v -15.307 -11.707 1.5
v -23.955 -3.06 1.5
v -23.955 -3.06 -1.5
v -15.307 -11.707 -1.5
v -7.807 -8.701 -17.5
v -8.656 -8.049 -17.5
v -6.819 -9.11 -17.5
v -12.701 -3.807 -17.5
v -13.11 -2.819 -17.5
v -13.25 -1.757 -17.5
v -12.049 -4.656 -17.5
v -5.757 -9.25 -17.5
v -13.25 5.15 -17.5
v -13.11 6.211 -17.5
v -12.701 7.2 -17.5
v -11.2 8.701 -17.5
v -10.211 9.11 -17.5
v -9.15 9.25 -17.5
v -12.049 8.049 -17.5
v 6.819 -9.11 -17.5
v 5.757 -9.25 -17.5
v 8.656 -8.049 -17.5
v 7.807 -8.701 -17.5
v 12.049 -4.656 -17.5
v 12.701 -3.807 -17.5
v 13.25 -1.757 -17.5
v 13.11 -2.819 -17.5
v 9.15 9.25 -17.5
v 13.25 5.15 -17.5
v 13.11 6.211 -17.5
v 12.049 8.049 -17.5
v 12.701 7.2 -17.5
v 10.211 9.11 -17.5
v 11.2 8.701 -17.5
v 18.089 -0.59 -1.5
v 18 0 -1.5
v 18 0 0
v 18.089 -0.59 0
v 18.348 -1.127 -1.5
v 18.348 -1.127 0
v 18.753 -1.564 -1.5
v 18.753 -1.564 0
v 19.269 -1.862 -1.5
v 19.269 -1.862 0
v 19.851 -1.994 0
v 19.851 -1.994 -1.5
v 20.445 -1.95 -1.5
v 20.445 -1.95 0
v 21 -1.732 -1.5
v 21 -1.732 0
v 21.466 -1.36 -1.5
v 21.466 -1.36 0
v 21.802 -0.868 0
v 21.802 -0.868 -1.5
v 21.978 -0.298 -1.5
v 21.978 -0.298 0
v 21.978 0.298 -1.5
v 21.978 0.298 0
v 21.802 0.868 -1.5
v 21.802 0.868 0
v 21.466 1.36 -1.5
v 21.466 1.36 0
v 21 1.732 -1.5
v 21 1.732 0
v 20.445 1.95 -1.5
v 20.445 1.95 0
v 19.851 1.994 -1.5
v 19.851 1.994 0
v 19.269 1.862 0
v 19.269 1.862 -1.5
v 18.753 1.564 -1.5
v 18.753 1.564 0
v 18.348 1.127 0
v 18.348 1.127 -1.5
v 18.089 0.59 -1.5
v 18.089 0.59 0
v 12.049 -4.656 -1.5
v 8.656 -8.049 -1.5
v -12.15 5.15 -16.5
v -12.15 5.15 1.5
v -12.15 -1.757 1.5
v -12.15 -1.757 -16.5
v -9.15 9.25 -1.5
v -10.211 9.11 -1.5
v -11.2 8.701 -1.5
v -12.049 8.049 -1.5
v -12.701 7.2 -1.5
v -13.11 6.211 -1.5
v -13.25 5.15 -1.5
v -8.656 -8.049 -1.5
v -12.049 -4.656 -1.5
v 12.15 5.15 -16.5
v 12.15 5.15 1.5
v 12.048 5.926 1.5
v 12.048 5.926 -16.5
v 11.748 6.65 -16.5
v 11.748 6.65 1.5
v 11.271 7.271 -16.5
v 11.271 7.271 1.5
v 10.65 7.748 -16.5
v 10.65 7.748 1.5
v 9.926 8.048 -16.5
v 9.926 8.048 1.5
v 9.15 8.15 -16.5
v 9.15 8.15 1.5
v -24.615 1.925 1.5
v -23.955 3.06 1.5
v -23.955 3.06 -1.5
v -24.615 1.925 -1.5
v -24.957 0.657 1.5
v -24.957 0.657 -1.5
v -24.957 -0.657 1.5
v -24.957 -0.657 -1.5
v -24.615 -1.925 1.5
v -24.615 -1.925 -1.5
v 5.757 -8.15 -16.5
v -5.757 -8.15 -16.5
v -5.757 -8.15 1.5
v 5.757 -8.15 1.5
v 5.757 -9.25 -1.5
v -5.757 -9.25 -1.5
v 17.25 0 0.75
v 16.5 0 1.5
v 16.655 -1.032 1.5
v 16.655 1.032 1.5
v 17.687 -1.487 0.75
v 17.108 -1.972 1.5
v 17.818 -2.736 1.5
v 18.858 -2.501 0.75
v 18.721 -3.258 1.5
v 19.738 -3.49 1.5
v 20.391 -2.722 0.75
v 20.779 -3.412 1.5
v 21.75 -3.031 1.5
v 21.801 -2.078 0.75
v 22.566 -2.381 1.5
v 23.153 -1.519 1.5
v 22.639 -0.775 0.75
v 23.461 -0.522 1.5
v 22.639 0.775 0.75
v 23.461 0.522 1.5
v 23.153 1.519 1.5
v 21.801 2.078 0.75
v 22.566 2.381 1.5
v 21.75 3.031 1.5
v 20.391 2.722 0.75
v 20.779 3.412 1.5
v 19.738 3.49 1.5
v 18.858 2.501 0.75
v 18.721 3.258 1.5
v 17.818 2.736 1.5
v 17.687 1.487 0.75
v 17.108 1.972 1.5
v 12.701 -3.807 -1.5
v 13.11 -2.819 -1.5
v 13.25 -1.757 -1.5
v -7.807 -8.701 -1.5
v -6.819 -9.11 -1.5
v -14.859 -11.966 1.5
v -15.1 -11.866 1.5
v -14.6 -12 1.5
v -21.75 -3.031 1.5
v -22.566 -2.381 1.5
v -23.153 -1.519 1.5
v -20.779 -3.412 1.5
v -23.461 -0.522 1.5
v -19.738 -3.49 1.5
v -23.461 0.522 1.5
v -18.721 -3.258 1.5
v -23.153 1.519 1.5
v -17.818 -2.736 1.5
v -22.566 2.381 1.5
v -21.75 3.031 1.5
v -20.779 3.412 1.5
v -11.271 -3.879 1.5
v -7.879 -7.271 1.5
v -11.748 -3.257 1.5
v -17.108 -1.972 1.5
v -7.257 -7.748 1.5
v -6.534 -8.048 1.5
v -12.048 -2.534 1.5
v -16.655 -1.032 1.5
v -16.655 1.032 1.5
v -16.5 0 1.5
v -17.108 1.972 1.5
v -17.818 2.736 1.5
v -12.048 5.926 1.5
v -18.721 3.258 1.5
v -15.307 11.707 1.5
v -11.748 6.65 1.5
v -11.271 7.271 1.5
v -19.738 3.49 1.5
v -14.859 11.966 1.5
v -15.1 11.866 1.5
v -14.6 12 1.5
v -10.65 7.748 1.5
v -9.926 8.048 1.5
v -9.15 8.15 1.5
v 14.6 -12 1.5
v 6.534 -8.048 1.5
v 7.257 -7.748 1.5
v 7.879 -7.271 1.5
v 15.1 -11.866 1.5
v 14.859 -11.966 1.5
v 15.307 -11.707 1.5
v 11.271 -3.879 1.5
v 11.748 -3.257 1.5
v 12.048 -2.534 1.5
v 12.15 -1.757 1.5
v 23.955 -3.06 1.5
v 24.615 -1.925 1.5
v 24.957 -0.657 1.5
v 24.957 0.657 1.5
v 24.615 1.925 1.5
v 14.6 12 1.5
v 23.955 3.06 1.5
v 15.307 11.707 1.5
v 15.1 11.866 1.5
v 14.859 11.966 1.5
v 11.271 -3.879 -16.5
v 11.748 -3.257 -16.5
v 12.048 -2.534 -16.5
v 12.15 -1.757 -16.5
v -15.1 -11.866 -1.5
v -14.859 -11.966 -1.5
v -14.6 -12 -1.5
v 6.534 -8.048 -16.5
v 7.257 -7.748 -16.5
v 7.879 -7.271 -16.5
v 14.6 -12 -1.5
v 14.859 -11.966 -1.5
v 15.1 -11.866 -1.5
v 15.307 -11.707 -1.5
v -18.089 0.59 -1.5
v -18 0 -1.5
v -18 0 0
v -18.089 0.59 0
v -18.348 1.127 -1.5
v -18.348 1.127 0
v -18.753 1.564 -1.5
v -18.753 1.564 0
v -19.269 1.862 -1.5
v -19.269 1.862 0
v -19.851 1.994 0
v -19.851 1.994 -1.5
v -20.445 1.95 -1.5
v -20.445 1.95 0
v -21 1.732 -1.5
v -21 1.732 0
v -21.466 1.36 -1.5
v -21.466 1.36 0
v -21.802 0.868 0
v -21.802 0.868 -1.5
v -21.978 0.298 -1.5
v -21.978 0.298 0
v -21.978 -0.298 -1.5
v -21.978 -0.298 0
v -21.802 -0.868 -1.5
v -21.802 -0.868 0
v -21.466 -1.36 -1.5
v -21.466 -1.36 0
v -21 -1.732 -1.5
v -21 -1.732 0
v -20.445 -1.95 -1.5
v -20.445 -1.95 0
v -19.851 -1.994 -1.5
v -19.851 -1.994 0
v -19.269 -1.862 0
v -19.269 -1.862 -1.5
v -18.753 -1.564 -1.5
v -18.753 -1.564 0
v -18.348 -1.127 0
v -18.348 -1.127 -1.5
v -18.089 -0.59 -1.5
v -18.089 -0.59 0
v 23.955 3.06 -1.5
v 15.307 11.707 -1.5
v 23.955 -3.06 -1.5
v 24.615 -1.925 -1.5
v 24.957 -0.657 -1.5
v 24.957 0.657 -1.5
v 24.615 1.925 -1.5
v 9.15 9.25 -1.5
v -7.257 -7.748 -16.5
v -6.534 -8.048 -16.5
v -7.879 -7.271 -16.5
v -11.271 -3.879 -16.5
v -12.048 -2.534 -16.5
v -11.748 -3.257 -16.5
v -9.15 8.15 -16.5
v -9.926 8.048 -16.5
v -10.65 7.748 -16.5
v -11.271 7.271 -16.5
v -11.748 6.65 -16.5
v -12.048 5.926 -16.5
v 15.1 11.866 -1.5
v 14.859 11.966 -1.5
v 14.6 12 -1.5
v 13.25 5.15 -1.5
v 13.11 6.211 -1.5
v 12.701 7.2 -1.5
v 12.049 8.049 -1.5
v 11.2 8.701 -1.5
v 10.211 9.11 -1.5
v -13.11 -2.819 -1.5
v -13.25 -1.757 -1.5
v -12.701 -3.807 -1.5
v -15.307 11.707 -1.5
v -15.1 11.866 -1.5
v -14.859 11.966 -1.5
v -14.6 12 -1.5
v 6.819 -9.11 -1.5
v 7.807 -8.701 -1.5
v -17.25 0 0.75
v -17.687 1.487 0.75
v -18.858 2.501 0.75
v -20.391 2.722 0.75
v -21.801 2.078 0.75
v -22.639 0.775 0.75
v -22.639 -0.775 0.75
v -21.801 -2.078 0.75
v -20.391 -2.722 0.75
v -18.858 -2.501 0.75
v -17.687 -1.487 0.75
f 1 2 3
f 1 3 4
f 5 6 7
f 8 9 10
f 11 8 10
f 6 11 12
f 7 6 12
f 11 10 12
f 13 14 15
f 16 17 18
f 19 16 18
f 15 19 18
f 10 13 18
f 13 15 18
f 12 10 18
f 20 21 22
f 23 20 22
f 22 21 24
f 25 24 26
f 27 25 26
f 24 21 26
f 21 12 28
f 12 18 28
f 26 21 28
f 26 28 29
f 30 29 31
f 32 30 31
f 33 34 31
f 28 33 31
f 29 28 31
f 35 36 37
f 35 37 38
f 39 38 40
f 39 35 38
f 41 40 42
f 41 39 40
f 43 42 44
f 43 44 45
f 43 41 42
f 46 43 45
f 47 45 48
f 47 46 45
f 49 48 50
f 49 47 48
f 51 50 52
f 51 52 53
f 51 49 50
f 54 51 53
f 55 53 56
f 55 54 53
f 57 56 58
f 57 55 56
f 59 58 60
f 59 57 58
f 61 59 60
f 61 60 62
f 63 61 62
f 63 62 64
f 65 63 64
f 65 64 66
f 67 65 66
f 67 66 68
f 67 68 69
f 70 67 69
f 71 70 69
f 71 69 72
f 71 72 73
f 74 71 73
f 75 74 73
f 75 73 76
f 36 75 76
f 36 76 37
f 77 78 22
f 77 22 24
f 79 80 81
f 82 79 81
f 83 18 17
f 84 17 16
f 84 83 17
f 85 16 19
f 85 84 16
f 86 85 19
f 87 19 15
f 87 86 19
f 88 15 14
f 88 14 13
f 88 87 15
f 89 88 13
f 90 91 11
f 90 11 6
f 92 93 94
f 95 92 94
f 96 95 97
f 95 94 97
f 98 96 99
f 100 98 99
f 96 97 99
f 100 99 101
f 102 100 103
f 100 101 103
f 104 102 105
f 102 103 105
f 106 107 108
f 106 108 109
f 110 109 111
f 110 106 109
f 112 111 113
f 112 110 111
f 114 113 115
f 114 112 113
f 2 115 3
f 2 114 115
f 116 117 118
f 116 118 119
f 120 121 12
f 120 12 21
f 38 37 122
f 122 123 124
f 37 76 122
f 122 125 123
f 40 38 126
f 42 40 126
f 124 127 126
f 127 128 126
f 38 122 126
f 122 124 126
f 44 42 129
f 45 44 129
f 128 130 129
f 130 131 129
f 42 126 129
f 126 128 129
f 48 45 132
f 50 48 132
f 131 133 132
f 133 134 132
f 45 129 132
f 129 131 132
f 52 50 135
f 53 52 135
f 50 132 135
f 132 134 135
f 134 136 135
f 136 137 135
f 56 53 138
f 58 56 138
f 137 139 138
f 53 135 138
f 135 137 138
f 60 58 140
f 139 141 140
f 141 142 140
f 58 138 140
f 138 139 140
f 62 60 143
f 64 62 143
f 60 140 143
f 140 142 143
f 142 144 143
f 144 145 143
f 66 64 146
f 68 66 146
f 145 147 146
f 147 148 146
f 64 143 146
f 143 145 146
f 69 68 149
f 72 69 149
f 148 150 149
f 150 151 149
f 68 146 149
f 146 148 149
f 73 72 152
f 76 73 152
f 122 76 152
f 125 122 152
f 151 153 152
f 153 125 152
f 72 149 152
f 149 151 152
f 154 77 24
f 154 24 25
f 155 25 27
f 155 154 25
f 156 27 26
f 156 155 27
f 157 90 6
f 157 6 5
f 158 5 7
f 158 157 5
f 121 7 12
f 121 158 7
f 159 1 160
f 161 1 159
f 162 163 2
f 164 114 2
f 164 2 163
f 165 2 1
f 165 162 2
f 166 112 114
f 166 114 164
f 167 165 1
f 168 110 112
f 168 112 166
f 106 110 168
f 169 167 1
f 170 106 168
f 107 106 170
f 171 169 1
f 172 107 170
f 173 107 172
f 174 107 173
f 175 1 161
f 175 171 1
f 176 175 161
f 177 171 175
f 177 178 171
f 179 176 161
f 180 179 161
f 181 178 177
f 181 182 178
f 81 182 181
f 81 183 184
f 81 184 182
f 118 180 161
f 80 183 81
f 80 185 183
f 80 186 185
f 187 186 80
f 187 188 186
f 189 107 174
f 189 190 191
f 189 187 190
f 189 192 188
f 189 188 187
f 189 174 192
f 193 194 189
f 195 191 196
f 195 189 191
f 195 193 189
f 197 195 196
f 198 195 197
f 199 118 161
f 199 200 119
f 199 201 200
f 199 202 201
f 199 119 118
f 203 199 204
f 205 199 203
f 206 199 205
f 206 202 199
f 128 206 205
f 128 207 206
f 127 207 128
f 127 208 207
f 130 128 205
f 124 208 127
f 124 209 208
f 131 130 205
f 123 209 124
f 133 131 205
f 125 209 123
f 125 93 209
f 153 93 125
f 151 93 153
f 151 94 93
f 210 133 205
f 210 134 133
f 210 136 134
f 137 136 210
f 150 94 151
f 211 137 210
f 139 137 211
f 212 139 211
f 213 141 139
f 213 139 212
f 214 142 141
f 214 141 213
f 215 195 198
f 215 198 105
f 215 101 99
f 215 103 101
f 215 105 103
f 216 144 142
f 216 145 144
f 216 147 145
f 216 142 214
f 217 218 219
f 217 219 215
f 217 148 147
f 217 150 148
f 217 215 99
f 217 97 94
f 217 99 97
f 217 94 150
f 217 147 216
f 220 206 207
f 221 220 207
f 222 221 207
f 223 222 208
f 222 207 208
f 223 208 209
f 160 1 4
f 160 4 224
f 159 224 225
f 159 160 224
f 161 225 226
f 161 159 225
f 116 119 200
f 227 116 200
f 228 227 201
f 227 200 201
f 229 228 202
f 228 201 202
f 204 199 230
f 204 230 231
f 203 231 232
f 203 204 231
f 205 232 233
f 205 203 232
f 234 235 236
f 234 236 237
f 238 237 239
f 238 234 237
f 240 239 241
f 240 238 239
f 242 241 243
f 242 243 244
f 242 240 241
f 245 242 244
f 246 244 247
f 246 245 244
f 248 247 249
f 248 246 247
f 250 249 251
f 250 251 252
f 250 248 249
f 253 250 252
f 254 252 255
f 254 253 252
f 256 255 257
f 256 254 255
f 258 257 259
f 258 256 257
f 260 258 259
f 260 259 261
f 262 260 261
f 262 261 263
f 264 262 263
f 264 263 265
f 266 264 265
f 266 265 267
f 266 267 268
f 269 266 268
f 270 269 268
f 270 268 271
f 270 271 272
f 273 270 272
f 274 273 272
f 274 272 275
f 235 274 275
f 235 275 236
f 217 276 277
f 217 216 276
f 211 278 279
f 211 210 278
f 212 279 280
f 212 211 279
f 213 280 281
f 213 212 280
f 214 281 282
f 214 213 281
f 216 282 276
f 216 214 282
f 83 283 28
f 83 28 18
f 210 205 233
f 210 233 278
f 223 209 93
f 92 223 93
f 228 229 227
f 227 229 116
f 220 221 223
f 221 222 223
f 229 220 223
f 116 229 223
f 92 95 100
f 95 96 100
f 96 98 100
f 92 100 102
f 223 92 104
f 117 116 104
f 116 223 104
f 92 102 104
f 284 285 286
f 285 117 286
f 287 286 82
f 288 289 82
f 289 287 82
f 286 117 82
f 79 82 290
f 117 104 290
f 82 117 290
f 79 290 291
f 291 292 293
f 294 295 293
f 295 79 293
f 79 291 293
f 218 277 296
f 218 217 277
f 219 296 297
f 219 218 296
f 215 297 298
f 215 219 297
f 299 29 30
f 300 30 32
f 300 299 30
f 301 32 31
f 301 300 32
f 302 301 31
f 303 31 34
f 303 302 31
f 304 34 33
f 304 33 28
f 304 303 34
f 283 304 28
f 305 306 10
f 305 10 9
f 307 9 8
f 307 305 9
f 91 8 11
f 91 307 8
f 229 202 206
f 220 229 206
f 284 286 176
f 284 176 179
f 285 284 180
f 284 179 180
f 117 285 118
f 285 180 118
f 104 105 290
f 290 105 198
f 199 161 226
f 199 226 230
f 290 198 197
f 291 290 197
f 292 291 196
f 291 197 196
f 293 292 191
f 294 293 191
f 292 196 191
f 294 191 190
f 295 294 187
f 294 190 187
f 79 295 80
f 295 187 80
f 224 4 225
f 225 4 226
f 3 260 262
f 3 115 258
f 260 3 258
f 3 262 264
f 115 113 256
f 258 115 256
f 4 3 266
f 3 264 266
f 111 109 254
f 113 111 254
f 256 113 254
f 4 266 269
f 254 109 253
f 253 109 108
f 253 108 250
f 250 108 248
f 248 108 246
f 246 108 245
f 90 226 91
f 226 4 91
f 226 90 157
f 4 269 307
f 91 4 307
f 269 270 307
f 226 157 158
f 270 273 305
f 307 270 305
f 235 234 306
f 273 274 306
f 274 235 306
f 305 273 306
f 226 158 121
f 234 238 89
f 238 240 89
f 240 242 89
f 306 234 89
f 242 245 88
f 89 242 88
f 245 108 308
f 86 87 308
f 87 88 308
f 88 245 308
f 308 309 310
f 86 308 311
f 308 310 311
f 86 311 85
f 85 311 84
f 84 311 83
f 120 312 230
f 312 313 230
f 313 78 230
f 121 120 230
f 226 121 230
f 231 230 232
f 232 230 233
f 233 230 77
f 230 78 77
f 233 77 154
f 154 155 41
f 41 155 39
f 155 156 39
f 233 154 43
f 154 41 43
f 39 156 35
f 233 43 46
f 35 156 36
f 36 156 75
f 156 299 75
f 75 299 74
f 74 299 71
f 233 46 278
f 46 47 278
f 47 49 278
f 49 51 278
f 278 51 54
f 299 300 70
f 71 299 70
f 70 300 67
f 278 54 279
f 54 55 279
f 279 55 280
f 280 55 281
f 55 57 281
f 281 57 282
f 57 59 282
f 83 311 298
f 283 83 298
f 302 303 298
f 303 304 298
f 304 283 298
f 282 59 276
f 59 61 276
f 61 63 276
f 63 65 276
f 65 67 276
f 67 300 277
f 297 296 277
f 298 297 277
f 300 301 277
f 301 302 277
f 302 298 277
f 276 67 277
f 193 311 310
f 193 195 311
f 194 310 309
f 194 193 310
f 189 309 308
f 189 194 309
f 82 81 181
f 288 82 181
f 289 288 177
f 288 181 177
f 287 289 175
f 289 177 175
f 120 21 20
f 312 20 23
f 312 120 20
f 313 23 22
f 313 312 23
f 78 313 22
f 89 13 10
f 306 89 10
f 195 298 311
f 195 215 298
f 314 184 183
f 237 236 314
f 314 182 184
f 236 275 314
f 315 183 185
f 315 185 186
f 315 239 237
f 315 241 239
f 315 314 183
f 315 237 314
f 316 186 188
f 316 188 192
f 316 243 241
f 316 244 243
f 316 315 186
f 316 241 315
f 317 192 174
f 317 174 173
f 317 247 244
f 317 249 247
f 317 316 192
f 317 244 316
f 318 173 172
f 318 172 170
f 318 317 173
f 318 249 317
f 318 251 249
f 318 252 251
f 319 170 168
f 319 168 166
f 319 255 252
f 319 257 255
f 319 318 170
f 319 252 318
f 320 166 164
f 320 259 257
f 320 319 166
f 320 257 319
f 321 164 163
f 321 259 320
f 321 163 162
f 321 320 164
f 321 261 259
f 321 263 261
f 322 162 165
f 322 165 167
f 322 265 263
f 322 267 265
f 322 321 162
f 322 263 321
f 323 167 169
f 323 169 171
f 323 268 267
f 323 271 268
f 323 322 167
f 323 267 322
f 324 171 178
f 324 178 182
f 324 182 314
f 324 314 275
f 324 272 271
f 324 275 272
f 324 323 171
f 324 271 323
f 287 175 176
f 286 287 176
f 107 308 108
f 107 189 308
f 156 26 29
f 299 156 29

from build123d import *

# Parameters (mm, degrees)
SKETCH2_R           = 2
BOSS_EXTRUDE1_DEPTH = 1.5
BOSS_EXTRUDE2_DEPTH = 16
BOSS_EXTRUDE3_START = -1
BOSS_EXTRUDE3_DEPTH = 1
CHAMFER1_SIZE       = 1.5


with BuildPart() as part:
    # Sketch2 → Boss-Extrude1 (new, symmetric)
    with BuildSketch(Plane.XY):
        with BuildLine():
            Line((-15.307106781, 11.707106781), (-23.954546191, 3.059667371))
            ThreePointArc((-23.954546191, 3.059667371), (-25, 0), (-23.954546191, -3.059667371))
            Line((-23.954546191, -3.059667371), (-15.307106781, -11.707106781))
            ThreePointArc((-15.307106781, -11.707106781), (-14.982683432, -11.923879533), (-14.6, -12))
            Line((-14.6, -12), (14.6, -12))
            ThreePointArc((14.6, -12), (14.982683432, -11.923879533), (15.307106781, -11.707106781))
            Line((15.307106781, -11.707106781), (23.954546191, -3.059667371))
            ThreePointArc((23.954546191, -3.059667371), (25, 0), (23.954546191, 3.059667371))
            Line((23.954546191, 3.059667371), (15.307106781, 11.707106781))
            ThreePointArc((15.307106781, 11.707106781), (14.982683432, 11.923879533), (14.6, 12))
            Line((14.6, 12), (-14.6, 12))
            ThreePointArc((-14.6, 12), (-14.982683432, 11.923879533), (-15.307106781, 11.707106781))
        make_face()
        with Locations((-20, 0)):
            Circle(SKETCH2_R, mode=Mode.SUBTRACT)
        with Locations(Location((20, 0, 0), (0, 0, 180))):
            Circle(SKETCH2_R, mode=Mode.SUBTRACT)
        with BuildLine():
            Line((-11.271320344, -3.878679656), (-7.878679656, -7.271320344))
            ThreePointArc((-7.878679656, -7.271320344), (-6.90540961, -7.921638598), (-5.757359313, -8.15))
            Line((-5.757359313, -8.15), (5.757359313, -8.15))
            ThreePointArc((5.757359313, -8.15), (6.90540961, -7.921638598), (7.878679656, -7.271320344))
            Line((7.878679656, -7.271320344), (11.271320344, -3.878679656))
            ThreePointArc((11.271320344, -3.878679656), (11.921638598, -2.90540961), (12.15, -1.757359313))
            Line((12.15, -1.757359313), (12.15, 5.15))
            ThreePointArc((12.15, 5.15), (11.271320344, 7.271320344), (9.15, 8.15))
            Line((9.15, 8.15), (-9.15, 8.15))
            ThreePointArc((-9.15, 8.15), (-11.271320344, 7.271320344), (-12.15, 5.15))
            Line((-12.15, 5.15), (-12.15, -1.757359313))
            ThreePointArc((-12.15, -1.757359313), (-11.921638598, -2.90540961), (-11.271320344, -3.878679656))
        make_face(mode=Mode.SUBTRACT)
    extrude(amount=BOSS_EXTRUDE1_DEPTH, both=True)

    # Sketch3 → Boss-Extrude2 (add)
    with BuildSketch(Plane(origin=(0, 0, -1.5), x_dir=(-1, 0, 0), z_dir=(0, 0, -1))):
        with BuildLine():
            Line((-9.15, 9.25), (9.15, 9.25))
            ThreePointArc((9.15, 9.25), (12.049137803, 8.049137803), (13.25, 5.15))
            Line((13.25, 5.15), (13.25, -1.757359313))
            ThreePointArc((13.25, -1.757359313), (12.937906083, -3.326361386), (12.049137803, -4.656497116))
            Line((12.049137803, -4.656497116), (8.656497116, -8.049137803))
            ThreePointArc((8.656497116, -8.049137803), (7.326361386, -8.937906083), (5.757359313, -9.25))
            Line((5.757359313, -9.25), (-5.757359313, -9.25))
            ThreePointArc((-5.757359313, -9.25), (-7.326361386, -8.937906083), (-8.656497116, -8.049137803))
            Line((-8.656497116, -8.049137803), (-12.049137803, -4.656497116))
            ThreePointArc((-12.049137803, -4.656497116), (-12.937906083, -3.326361386), (-13.25, -1.757359313))
            Line((-13.25, -1.757359313), (-13.25, 5.15))
            ThreePointArc((-13.25, 5.15), (-12.049137803, 8.049137803), (-9.15, 9.25))
        make_face()
        with BuildLine():
            Line((12.15, 5.15), (12.15, -1.757359313))
            ThreePointArc((12.15, -1.757359313), (11.921638598, -2.90540961), (11.271320344, -3.878679656))
            Line((11.271320344, -3.878679656), (7.878679656, -7.271320344))
            ThreePointArc((7.878679656, -7.271320344), (6.90540961, -7.921638598), (5.757359313, -8.15))
            Line((5.757359313, -8.15), (-5.757359313, -8.15))
            ThreePointArc((-5.757359313, -8.15), (-6.90540961, -7.921638598), (-7.878679656, -7.271320344))
            Line((-7.878679656, -7.271320344), (-11.271320344, -3.878679656))
            ThreePointArc((-11.271320344, -3.878679656), (-11.921638598, -2.90540961), (-12.15, -1.757359313))
            Line((-12.15, -1.757359313), (-12.15, 5.15))
            ThreePointArc((-12.15, 5.15), (-11.271320344, 7.271320344), (-9.15, 8.15))
            Line((-9.15, 8.15), (9.15, 8.15))
            ThreePointArc((9.15, 8.15), (11.271320344, 7.271320344), (12.15, 5.15))
        make_face(mode=Mode.SUBTRACT)
    extrude(amount=BOSS_EXTRUDE2_DEPTH)

    # Sketch4 → Boss-Extrude3 (add)
    with BuildSketch(Plane(origin=(0, 0, -17.5), x_dir=(-1, 0, 0), z_dir=(0, 0, -1)).offset(BOSS_EXTRUDE3_START)):
        with BuildLine():
            Line((9.15, 9.25), (-9.15, 9.25))
            ThreePointArc((-9.15, 9.25), (-12.049137803, 8.049137803), (-13.25, 5.15))
            Line((-13.25, 5.15), (-13.25, -1.757359313))
            ThreePointArc((-13.25, -1.757359313), (-12.937906083, -3.326361386), (-12.049137803, -4.656497116))
            Line((-12.049137803, -4.656497116), (-8.656497116, -8.049137803))
            ThreePointArc((-8.656497116, -8.049137803), (-7.326361386, -8.937906083), (-5.757359313, -9.25))
            Line((-5.757359313, -9.25), (5.757359313, -9.25))
            ThreePointArc((5.757359313, -9.25), (7.326361386, -8.937906083), (8.656497116, -8.049137803))
            Line((8.656497116, -8.049137803), (12.049137803, -4.656497116))
            ThreePointArc((12.049137803, -4.656497116), (12.937906083, -3.326361386), (13.25, -1.757359313))
            Line((13.25, -1.757359313), (13.25, 5.15))
            ThreePointArc((13.25, 5.15), (12.049137803, 8.049137803), (9.15, 9.25))
        make_face()
    extrude(amount=BOSS_EXTRUDE3_DEPTH)

    # Chamfer1
    chamfer1_edges = [part.edges().sort_by_distance(p)[0] for p in [
        (22, 0, 1.5),
        (-22, 0, 1.5),
    ]]
    chamfer(chamfer1_edges, length=CHAMFER1_SIZE)


solid = part.part
